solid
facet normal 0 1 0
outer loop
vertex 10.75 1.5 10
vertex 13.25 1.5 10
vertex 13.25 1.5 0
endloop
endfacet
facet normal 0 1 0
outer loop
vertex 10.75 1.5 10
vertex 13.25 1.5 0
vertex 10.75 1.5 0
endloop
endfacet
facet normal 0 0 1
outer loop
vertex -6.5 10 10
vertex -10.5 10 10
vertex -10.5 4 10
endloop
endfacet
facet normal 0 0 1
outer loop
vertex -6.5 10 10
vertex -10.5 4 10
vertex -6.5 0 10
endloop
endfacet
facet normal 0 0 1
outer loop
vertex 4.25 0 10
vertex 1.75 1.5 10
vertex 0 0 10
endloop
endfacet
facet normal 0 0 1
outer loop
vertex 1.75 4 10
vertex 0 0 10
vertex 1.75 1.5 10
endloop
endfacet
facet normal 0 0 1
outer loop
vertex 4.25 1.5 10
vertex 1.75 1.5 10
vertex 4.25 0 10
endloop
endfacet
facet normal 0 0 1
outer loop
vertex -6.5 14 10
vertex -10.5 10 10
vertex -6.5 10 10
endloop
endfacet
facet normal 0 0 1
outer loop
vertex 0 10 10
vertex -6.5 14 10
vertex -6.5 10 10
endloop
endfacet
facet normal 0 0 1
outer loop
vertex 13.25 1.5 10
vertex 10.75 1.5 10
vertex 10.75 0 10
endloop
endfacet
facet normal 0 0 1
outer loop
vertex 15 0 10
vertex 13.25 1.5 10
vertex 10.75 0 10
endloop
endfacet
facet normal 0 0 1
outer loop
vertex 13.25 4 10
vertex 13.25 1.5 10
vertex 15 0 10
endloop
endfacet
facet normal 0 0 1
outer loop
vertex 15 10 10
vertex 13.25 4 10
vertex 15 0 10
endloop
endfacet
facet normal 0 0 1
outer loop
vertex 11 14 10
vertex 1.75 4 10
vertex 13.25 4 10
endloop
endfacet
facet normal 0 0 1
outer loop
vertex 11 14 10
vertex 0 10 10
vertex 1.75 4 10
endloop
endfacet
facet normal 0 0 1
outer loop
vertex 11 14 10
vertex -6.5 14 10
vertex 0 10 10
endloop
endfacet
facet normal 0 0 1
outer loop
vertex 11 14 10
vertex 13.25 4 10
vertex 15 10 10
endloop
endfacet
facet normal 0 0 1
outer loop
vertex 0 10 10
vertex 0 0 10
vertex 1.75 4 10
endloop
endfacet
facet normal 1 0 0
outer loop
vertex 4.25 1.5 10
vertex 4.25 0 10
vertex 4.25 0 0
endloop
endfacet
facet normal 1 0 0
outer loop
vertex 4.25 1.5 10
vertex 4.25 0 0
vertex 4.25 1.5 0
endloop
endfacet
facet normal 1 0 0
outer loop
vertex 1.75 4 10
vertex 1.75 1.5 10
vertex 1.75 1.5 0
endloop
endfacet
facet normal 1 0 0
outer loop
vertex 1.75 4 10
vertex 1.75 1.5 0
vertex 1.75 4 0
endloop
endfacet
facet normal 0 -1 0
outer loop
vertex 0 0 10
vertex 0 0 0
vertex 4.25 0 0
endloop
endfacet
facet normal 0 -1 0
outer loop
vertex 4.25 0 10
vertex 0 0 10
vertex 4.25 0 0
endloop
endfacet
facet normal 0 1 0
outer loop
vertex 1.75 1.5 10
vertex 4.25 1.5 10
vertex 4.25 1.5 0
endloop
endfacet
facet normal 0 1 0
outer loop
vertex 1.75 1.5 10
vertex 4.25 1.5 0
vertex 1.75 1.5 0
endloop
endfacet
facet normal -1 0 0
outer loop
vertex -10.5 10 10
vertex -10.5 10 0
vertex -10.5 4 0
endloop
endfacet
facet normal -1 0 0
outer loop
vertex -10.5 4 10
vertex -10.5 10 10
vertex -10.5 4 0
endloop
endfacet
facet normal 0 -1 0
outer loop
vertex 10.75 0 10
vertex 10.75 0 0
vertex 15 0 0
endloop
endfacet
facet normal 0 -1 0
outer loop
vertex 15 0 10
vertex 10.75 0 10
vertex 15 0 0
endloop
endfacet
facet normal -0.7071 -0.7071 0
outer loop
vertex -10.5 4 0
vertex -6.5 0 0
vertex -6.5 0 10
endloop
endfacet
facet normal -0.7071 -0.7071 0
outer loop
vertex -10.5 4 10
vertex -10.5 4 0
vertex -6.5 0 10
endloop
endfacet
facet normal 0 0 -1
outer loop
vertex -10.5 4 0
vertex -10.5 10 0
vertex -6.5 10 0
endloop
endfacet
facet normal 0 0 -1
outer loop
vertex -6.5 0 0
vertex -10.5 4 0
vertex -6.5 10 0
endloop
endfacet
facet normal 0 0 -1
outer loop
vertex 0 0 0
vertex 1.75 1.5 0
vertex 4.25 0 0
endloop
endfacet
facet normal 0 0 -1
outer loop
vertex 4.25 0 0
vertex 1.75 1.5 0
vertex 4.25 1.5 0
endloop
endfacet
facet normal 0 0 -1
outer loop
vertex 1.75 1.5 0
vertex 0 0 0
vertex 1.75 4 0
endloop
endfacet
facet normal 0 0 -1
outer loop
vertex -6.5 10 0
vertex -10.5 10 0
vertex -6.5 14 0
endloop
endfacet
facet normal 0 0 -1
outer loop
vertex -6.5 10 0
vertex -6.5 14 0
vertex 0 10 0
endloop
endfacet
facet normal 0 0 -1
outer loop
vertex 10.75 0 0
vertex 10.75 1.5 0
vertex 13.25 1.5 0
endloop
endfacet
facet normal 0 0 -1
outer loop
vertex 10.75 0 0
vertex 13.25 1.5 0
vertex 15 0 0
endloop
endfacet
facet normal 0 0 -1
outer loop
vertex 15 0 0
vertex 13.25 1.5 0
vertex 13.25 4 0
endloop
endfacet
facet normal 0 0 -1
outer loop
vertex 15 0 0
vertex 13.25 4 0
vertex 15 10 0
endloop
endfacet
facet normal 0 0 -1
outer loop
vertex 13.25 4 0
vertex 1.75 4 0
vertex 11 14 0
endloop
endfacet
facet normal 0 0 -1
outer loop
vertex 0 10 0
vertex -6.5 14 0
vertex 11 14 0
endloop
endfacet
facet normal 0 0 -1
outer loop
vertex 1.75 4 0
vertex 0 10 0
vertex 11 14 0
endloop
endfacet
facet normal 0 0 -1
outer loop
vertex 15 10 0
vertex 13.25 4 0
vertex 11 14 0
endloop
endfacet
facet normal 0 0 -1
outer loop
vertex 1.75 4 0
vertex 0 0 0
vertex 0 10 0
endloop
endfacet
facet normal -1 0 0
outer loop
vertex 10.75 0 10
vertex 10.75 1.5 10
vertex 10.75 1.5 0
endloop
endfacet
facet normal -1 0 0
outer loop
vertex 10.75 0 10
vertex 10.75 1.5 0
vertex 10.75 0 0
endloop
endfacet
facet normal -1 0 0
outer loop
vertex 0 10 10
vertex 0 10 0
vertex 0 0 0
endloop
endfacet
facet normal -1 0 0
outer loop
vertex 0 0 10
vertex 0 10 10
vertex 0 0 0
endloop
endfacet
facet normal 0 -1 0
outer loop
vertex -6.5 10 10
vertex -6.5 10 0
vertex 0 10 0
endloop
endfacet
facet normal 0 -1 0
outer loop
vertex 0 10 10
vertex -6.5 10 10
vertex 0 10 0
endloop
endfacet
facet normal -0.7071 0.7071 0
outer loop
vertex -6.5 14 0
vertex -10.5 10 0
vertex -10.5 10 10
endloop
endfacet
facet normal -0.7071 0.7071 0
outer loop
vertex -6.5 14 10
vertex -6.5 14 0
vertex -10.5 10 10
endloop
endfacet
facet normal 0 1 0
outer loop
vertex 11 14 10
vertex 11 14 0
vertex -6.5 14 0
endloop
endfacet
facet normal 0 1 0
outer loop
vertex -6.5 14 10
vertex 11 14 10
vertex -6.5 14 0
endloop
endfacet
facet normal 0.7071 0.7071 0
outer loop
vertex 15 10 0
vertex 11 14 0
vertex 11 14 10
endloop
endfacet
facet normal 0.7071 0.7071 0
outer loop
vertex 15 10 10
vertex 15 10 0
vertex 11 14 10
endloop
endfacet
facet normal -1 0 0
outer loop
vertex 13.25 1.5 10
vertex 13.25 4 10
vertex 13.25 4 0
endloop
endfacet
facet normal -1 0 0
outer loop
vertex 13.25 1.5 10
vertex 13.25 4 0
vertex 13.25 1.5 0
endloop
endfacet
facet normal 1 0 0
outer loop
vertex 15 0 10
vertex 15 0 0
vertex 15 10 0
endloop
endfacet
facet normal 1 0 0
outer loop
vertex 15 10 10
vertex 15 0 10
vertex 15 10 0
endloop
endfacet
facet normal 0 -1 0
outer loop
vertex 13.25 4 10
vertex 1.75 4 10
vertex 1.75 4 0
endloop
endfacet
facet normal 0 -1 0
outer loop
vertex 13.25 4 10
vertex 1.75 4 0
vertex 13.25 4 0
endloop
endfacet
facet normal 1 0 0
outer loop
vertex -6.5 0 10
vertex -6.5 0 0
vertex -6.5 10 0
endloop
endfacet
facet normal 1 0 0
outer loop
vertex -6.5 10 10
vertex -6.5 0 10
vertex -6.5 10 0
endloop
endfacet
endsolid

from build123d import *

# Parameters (mm, degrees)
BOSS_EXTRUDE1_DEPTH = 10
CHAMFER1_SIZE       = 4
CUT_EXTRUDE1_DEPTH  = 23.825424421


with BuildPart() as part:
    # Sketch1 → Boss-Extrude1 (new body)
    with BuildSketch(Plane.XY):
        Polygon((0, 0), (15, 0), (15, 14), (-10.5, 14), (-10.5, 0), (-6.5, 0), (-6.5, 10), (0, 10), align=None)
    extrude(amount=BOSS_EXTRUDE1_DEPTH)

    # Chamfer1
    chamfer1_edges = [part.edges().sort_by_distance(p)[0] for p in [
        (-10.5, 14, 5),
        (15, 14, 5),
        (-10.5, 0, 5),
    ]]
    chamfer(chamfer1_edges, length=CHAMFER1_SIZE - 0.0001)  # a hair under: the kernel refuses the full size

    # Sketch2 → Cut-Extrude1 (cut, through all)
    with BuildSketch(Plane.XY.offset(10)):
        Polygon((4.25, 0), (4.25, 1.5), (1.75, 1.5), (1.75, 4), (13.25, 4), (13.25, 1.5), (10.75, 1.5), (10.75, 0), align=None)
    extrude(amount=-CUT_EXTRUDE1_DEPTH, mode=Mode.SUBTRACT)


solid = part.part
